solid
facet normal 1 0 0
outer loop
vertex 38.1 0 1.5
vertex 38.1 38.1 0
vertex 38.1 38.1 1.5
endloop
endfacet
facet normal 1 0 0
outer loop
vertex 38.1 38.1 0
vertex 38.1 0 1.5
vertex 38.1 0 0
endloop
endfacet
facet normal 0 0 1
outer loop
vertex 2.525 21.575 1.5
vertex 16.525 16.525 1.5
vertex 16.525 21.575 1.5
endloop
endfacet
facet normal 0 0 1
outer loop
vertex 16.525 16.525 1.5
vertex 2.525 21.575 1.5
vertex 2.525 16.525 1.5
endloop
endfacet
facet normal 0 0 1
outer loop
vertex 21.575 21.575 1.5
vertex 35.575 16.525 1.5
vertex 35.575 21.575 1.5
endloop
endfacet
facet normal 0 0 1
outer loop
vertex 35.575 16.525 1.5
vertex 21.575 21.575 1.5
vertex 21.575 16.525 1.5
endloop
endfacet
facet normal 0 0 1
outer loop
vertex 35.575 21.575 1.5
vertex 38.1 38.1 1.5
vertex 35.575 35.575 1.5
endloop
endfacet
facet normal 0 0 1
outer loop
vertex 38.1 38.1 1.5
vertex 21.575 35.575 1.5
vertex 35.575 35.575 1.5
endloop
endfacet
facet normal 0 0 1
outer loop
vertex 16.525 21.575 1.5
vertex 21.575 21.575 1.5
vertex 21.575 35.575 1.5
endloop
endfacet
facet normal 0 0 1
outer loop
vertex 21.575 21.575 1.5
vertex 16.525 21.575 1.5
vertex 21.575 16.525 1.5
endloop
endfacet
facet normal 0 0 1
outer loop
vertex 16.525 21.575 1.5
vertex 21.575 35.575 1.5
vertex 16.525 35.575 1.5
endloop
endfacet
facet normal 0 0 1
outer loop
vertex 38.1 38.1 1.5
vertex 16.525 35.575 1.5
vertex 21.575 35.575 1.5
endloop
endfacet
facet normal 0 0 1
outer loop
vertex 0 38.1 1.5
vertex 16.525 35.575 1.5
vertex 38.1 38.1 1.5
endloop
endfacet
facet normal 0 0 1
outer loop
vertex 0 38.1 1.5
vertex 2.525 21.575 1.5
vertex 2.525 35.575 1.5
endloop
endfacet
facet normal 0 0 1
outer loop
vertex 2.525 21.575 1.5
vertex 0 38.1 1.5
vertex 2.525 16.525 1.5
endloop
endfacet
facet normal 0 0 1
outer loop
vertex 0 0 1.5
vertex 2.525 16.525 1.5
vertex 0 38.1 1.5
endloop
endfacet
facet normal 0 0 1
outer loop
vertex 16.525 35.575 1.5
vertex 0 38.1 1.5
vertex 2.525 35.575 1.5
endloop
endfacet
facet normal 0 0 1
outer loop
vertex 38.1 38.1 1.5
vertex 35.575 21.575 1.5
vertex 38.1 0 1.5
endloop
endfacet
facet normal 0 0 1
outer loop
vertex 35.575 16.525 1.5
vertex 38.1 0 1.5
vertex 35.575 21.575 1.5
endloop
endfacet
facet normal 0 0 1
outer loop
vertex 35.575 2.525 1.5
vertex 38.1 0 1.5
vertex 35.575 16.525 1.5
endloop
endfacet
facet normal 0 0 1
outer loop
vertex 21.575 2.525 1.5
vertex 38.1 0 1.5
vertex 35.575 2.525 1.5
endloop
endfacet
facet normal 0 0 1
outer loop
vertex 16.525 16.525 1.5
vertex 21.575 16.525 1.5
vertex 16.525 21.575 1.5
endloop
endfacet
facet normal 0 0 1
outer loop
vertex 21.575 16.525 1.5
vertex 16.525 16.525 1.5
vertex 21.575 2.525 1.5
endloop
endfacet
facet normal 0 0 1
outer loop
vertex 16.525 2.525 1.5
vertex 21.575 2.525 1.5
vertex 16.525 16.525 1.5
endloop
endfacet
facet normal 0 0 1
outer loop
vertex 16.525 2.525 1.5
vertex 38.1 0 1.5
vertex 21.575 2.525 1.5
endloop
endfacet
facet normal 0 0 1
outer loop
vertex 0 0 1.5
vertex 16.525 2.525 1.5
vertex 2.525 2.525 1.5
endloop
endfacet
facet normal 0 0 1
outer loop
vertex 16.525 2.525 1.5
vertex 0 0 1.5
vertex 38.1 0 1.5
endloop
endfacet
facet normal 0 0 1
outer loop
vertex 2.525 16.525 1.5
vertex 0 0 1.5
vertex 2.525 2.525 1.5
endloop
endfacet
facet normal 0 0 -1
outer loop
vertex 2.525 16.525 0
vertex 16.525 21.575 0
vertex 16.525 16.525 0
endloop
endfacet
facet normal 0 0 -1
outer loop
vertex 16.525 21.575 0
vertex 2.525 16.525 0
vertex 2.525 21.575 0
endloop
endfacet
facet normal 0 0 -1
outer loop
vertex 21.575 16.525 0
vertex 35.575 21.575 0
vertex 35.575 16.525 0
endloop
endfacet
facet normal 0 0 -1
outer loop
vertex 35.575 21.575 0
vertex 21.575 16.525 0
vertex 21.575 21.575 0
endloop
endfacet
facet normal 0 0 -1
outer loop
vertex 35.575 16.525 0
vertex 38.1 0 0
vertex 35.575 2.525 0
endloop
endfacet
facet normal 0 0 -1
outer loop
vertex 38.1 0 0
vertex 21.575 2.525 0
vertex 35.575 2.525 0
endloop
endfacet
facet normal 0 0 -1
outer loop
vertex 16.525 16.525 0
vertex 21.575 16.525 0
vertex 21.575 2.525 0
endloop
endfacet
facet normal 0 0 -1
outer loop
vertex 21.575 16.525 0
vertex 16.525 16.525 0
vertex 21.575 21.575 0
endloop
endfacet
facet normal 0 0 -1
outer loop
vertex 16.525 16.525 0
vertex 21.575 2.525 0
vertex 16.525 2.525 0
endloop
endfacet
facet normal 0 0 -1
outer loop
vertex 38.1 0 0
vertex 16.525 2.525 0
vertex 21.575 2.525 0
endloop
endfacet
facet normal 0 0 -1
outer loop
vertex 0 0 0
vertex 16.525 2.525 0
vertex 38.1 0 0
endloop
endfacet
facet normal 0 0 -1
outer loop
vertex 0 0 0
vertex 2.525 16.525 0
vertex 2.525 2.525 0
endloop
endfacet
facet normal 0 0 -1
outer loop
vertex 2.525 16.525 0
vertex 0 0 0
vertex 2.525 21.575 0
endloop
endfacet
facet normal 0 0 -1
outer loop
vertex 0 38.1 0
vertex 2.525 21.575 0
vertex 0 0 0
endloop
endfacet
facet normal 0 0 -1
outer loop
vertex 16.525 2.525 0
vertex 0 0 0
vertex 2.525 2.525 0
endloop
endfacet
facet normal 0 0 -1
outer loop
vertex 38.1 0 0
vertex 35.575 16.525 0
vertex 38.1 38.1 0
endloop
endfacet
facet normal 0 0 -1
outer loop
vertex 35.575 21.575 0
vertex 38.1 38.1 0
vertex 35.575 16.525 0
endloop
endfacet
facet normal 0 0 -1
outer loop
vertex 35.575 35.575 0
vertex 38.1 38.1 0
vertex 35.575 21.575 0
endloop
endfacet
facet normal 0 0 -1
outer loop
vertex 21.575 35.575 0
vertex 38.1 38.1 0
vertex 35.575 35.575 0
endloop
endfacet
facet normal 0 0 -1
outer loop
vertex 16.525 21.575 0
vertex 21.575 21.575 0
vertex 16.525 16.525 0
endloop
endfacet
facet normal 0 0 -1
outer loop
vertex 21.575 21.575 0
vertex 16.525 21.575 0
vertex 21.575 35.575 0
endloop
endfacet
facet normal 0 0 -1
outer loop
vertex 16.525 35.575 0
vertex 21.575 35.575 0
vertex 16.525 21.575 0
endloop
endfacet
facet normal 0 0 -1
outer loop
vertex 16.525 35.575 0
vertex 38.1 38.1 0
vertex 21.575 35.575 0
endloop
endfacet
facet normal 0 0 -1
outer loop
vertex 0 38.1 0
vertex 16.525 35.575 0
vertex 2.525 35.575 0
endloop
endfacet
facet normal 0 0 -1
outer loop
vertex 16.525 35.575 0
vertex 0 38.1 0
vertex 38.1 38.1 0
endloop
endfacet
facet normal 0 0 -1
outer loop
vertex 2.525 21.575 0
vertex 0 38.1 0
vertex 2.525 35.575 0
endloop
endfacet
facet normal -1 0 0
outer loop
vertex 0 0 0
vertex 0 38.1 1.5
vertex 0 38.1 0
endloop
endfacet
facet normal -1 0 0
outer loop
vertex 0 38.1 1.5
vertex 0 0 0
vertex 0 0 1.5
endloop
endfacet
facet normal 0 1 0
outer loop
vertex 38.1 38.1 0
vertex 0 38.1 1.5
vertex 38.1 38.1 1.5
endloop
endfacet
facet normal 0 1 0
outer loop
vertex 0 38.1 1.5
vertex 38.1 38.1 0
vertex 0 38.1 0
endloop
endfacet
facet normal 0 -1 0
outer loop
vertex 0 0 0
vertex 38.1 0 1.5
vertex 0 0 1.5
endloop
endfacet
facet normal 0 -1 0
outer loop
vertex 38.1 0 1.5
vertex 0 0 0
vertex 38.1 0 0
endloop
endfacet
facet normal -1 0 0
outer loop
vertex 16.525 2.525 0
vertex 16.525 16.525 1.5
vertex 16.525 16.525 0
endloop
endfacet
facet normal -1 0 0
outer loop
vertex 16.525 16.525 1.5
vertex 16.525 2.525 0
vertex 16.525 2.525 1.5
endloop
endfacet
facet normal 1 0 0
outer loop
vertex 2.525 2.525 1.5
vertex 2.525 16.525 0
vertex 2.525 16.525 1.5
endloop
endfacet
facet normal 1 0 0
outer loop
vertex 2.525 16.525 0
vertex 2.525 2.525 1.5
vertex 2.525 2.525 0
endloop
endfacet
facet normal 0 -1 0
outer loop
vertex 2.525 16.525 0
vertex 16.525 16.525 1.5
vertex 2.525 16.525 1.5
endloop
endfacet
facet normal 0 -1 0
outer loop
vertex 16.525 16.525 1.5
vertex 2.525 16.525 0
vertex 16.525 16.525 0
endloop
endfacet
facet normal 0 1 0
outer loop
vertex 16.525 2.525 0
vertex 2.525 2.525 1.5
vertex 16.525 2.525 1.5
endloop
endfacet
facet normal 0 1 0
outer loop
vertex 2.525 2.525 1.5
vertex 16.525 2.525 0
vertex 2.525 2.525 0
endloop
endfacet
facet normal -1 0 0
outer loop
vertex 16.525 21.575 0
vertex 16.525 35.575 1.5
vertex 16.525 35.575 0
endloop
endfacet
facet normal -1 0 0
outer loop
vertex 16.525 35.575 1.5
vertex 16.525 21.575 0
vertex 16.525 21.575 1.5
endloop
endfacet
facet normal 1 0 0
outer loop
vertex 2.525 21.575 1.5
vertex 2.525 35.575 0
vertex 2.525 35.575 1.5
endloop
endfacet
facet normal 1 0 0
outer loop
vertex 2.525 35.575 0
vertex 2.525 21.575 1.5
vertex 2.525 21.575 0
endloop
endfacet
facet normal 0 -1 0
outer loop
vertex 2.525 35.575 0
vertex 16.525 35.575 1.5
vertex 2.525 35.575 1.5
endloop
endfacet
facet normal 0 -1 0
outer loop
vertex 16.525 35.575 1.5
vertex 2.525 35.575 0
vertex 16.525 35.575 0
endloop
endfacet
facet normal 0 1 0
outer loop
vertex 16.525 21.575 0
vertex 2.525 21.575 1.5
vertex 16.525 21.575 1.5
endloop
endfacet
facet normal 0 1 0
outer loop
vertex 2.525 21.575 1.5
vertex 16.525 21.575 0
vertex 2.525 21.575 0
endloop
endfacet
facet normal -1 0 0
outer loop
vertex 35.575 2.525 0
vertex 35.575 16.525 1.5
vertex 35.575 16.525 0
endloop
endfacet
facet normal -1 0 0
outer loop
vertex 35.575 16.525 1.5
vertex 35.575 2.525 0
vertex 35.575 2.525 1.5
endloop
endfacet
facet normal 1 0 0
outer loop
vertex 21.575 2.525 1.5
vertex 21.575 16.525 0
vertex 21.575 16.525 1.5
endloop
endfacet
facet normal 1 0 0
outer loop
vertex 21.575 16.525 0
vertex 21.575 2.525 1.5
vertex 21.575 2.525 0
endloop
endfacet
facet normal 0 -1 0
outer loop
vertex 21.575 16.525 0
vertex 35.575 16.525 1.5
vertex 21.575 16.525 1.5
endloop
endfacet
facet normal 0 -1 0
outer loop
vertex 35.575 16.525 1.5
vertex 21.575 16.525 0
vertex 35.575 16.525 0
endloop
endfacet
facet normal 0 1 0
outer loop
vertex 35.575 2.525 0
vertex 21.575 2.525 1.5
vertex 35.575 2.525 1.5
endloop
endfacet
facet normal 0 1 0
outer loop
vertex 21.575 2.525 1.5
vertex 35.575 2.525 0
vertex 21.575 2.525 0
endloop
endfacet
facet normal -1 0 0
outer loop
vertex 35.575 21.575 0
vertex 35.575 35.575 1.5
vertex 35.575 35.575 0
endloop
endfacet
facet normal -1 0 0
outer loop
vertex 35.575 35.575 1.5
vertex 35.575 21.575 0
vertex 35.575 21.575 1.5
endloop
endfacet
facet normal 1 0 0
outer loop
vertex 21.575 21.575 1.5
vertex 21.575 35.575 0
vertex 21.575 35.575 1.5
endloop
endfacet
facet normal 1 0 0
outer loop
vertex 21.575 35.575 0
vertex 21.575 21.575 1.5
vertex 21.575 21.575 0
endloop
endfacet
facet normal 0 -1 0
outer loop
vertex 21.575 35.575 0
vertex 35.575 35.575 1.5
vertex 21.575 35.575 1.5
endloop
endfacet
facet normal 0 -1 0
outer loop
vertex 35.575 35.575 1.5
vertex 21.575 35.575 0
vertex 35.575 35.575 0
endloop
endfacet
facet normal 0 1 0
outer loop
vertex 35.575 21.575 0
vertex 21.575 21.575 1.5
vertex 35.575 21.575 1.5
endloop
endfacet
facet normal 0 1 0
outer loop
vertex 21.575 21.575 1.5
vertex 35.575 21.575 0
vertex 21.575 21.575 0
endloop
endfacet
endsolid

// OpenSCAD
$fs = 0.1;
$fa = 10;

difference() {
    cube([2 * 19.05, 2 * 19.05, 1.5]);
    translate([0.5 * 19.05, 0.5 * 19.05]) cube([14, 14, 6], center = true);
    translate([0.5 * 19.05, 1.5 * 19.05]) cube([14, 14, 6], center = true);
    translate([1.5 * 19.05, 0.5 * 19.05]) cube([14, 14, 6], center = true);
    translate([1.5 * 19.05, 1.5 * 19.05]) cube([14, 14, 6], center = true);
}
